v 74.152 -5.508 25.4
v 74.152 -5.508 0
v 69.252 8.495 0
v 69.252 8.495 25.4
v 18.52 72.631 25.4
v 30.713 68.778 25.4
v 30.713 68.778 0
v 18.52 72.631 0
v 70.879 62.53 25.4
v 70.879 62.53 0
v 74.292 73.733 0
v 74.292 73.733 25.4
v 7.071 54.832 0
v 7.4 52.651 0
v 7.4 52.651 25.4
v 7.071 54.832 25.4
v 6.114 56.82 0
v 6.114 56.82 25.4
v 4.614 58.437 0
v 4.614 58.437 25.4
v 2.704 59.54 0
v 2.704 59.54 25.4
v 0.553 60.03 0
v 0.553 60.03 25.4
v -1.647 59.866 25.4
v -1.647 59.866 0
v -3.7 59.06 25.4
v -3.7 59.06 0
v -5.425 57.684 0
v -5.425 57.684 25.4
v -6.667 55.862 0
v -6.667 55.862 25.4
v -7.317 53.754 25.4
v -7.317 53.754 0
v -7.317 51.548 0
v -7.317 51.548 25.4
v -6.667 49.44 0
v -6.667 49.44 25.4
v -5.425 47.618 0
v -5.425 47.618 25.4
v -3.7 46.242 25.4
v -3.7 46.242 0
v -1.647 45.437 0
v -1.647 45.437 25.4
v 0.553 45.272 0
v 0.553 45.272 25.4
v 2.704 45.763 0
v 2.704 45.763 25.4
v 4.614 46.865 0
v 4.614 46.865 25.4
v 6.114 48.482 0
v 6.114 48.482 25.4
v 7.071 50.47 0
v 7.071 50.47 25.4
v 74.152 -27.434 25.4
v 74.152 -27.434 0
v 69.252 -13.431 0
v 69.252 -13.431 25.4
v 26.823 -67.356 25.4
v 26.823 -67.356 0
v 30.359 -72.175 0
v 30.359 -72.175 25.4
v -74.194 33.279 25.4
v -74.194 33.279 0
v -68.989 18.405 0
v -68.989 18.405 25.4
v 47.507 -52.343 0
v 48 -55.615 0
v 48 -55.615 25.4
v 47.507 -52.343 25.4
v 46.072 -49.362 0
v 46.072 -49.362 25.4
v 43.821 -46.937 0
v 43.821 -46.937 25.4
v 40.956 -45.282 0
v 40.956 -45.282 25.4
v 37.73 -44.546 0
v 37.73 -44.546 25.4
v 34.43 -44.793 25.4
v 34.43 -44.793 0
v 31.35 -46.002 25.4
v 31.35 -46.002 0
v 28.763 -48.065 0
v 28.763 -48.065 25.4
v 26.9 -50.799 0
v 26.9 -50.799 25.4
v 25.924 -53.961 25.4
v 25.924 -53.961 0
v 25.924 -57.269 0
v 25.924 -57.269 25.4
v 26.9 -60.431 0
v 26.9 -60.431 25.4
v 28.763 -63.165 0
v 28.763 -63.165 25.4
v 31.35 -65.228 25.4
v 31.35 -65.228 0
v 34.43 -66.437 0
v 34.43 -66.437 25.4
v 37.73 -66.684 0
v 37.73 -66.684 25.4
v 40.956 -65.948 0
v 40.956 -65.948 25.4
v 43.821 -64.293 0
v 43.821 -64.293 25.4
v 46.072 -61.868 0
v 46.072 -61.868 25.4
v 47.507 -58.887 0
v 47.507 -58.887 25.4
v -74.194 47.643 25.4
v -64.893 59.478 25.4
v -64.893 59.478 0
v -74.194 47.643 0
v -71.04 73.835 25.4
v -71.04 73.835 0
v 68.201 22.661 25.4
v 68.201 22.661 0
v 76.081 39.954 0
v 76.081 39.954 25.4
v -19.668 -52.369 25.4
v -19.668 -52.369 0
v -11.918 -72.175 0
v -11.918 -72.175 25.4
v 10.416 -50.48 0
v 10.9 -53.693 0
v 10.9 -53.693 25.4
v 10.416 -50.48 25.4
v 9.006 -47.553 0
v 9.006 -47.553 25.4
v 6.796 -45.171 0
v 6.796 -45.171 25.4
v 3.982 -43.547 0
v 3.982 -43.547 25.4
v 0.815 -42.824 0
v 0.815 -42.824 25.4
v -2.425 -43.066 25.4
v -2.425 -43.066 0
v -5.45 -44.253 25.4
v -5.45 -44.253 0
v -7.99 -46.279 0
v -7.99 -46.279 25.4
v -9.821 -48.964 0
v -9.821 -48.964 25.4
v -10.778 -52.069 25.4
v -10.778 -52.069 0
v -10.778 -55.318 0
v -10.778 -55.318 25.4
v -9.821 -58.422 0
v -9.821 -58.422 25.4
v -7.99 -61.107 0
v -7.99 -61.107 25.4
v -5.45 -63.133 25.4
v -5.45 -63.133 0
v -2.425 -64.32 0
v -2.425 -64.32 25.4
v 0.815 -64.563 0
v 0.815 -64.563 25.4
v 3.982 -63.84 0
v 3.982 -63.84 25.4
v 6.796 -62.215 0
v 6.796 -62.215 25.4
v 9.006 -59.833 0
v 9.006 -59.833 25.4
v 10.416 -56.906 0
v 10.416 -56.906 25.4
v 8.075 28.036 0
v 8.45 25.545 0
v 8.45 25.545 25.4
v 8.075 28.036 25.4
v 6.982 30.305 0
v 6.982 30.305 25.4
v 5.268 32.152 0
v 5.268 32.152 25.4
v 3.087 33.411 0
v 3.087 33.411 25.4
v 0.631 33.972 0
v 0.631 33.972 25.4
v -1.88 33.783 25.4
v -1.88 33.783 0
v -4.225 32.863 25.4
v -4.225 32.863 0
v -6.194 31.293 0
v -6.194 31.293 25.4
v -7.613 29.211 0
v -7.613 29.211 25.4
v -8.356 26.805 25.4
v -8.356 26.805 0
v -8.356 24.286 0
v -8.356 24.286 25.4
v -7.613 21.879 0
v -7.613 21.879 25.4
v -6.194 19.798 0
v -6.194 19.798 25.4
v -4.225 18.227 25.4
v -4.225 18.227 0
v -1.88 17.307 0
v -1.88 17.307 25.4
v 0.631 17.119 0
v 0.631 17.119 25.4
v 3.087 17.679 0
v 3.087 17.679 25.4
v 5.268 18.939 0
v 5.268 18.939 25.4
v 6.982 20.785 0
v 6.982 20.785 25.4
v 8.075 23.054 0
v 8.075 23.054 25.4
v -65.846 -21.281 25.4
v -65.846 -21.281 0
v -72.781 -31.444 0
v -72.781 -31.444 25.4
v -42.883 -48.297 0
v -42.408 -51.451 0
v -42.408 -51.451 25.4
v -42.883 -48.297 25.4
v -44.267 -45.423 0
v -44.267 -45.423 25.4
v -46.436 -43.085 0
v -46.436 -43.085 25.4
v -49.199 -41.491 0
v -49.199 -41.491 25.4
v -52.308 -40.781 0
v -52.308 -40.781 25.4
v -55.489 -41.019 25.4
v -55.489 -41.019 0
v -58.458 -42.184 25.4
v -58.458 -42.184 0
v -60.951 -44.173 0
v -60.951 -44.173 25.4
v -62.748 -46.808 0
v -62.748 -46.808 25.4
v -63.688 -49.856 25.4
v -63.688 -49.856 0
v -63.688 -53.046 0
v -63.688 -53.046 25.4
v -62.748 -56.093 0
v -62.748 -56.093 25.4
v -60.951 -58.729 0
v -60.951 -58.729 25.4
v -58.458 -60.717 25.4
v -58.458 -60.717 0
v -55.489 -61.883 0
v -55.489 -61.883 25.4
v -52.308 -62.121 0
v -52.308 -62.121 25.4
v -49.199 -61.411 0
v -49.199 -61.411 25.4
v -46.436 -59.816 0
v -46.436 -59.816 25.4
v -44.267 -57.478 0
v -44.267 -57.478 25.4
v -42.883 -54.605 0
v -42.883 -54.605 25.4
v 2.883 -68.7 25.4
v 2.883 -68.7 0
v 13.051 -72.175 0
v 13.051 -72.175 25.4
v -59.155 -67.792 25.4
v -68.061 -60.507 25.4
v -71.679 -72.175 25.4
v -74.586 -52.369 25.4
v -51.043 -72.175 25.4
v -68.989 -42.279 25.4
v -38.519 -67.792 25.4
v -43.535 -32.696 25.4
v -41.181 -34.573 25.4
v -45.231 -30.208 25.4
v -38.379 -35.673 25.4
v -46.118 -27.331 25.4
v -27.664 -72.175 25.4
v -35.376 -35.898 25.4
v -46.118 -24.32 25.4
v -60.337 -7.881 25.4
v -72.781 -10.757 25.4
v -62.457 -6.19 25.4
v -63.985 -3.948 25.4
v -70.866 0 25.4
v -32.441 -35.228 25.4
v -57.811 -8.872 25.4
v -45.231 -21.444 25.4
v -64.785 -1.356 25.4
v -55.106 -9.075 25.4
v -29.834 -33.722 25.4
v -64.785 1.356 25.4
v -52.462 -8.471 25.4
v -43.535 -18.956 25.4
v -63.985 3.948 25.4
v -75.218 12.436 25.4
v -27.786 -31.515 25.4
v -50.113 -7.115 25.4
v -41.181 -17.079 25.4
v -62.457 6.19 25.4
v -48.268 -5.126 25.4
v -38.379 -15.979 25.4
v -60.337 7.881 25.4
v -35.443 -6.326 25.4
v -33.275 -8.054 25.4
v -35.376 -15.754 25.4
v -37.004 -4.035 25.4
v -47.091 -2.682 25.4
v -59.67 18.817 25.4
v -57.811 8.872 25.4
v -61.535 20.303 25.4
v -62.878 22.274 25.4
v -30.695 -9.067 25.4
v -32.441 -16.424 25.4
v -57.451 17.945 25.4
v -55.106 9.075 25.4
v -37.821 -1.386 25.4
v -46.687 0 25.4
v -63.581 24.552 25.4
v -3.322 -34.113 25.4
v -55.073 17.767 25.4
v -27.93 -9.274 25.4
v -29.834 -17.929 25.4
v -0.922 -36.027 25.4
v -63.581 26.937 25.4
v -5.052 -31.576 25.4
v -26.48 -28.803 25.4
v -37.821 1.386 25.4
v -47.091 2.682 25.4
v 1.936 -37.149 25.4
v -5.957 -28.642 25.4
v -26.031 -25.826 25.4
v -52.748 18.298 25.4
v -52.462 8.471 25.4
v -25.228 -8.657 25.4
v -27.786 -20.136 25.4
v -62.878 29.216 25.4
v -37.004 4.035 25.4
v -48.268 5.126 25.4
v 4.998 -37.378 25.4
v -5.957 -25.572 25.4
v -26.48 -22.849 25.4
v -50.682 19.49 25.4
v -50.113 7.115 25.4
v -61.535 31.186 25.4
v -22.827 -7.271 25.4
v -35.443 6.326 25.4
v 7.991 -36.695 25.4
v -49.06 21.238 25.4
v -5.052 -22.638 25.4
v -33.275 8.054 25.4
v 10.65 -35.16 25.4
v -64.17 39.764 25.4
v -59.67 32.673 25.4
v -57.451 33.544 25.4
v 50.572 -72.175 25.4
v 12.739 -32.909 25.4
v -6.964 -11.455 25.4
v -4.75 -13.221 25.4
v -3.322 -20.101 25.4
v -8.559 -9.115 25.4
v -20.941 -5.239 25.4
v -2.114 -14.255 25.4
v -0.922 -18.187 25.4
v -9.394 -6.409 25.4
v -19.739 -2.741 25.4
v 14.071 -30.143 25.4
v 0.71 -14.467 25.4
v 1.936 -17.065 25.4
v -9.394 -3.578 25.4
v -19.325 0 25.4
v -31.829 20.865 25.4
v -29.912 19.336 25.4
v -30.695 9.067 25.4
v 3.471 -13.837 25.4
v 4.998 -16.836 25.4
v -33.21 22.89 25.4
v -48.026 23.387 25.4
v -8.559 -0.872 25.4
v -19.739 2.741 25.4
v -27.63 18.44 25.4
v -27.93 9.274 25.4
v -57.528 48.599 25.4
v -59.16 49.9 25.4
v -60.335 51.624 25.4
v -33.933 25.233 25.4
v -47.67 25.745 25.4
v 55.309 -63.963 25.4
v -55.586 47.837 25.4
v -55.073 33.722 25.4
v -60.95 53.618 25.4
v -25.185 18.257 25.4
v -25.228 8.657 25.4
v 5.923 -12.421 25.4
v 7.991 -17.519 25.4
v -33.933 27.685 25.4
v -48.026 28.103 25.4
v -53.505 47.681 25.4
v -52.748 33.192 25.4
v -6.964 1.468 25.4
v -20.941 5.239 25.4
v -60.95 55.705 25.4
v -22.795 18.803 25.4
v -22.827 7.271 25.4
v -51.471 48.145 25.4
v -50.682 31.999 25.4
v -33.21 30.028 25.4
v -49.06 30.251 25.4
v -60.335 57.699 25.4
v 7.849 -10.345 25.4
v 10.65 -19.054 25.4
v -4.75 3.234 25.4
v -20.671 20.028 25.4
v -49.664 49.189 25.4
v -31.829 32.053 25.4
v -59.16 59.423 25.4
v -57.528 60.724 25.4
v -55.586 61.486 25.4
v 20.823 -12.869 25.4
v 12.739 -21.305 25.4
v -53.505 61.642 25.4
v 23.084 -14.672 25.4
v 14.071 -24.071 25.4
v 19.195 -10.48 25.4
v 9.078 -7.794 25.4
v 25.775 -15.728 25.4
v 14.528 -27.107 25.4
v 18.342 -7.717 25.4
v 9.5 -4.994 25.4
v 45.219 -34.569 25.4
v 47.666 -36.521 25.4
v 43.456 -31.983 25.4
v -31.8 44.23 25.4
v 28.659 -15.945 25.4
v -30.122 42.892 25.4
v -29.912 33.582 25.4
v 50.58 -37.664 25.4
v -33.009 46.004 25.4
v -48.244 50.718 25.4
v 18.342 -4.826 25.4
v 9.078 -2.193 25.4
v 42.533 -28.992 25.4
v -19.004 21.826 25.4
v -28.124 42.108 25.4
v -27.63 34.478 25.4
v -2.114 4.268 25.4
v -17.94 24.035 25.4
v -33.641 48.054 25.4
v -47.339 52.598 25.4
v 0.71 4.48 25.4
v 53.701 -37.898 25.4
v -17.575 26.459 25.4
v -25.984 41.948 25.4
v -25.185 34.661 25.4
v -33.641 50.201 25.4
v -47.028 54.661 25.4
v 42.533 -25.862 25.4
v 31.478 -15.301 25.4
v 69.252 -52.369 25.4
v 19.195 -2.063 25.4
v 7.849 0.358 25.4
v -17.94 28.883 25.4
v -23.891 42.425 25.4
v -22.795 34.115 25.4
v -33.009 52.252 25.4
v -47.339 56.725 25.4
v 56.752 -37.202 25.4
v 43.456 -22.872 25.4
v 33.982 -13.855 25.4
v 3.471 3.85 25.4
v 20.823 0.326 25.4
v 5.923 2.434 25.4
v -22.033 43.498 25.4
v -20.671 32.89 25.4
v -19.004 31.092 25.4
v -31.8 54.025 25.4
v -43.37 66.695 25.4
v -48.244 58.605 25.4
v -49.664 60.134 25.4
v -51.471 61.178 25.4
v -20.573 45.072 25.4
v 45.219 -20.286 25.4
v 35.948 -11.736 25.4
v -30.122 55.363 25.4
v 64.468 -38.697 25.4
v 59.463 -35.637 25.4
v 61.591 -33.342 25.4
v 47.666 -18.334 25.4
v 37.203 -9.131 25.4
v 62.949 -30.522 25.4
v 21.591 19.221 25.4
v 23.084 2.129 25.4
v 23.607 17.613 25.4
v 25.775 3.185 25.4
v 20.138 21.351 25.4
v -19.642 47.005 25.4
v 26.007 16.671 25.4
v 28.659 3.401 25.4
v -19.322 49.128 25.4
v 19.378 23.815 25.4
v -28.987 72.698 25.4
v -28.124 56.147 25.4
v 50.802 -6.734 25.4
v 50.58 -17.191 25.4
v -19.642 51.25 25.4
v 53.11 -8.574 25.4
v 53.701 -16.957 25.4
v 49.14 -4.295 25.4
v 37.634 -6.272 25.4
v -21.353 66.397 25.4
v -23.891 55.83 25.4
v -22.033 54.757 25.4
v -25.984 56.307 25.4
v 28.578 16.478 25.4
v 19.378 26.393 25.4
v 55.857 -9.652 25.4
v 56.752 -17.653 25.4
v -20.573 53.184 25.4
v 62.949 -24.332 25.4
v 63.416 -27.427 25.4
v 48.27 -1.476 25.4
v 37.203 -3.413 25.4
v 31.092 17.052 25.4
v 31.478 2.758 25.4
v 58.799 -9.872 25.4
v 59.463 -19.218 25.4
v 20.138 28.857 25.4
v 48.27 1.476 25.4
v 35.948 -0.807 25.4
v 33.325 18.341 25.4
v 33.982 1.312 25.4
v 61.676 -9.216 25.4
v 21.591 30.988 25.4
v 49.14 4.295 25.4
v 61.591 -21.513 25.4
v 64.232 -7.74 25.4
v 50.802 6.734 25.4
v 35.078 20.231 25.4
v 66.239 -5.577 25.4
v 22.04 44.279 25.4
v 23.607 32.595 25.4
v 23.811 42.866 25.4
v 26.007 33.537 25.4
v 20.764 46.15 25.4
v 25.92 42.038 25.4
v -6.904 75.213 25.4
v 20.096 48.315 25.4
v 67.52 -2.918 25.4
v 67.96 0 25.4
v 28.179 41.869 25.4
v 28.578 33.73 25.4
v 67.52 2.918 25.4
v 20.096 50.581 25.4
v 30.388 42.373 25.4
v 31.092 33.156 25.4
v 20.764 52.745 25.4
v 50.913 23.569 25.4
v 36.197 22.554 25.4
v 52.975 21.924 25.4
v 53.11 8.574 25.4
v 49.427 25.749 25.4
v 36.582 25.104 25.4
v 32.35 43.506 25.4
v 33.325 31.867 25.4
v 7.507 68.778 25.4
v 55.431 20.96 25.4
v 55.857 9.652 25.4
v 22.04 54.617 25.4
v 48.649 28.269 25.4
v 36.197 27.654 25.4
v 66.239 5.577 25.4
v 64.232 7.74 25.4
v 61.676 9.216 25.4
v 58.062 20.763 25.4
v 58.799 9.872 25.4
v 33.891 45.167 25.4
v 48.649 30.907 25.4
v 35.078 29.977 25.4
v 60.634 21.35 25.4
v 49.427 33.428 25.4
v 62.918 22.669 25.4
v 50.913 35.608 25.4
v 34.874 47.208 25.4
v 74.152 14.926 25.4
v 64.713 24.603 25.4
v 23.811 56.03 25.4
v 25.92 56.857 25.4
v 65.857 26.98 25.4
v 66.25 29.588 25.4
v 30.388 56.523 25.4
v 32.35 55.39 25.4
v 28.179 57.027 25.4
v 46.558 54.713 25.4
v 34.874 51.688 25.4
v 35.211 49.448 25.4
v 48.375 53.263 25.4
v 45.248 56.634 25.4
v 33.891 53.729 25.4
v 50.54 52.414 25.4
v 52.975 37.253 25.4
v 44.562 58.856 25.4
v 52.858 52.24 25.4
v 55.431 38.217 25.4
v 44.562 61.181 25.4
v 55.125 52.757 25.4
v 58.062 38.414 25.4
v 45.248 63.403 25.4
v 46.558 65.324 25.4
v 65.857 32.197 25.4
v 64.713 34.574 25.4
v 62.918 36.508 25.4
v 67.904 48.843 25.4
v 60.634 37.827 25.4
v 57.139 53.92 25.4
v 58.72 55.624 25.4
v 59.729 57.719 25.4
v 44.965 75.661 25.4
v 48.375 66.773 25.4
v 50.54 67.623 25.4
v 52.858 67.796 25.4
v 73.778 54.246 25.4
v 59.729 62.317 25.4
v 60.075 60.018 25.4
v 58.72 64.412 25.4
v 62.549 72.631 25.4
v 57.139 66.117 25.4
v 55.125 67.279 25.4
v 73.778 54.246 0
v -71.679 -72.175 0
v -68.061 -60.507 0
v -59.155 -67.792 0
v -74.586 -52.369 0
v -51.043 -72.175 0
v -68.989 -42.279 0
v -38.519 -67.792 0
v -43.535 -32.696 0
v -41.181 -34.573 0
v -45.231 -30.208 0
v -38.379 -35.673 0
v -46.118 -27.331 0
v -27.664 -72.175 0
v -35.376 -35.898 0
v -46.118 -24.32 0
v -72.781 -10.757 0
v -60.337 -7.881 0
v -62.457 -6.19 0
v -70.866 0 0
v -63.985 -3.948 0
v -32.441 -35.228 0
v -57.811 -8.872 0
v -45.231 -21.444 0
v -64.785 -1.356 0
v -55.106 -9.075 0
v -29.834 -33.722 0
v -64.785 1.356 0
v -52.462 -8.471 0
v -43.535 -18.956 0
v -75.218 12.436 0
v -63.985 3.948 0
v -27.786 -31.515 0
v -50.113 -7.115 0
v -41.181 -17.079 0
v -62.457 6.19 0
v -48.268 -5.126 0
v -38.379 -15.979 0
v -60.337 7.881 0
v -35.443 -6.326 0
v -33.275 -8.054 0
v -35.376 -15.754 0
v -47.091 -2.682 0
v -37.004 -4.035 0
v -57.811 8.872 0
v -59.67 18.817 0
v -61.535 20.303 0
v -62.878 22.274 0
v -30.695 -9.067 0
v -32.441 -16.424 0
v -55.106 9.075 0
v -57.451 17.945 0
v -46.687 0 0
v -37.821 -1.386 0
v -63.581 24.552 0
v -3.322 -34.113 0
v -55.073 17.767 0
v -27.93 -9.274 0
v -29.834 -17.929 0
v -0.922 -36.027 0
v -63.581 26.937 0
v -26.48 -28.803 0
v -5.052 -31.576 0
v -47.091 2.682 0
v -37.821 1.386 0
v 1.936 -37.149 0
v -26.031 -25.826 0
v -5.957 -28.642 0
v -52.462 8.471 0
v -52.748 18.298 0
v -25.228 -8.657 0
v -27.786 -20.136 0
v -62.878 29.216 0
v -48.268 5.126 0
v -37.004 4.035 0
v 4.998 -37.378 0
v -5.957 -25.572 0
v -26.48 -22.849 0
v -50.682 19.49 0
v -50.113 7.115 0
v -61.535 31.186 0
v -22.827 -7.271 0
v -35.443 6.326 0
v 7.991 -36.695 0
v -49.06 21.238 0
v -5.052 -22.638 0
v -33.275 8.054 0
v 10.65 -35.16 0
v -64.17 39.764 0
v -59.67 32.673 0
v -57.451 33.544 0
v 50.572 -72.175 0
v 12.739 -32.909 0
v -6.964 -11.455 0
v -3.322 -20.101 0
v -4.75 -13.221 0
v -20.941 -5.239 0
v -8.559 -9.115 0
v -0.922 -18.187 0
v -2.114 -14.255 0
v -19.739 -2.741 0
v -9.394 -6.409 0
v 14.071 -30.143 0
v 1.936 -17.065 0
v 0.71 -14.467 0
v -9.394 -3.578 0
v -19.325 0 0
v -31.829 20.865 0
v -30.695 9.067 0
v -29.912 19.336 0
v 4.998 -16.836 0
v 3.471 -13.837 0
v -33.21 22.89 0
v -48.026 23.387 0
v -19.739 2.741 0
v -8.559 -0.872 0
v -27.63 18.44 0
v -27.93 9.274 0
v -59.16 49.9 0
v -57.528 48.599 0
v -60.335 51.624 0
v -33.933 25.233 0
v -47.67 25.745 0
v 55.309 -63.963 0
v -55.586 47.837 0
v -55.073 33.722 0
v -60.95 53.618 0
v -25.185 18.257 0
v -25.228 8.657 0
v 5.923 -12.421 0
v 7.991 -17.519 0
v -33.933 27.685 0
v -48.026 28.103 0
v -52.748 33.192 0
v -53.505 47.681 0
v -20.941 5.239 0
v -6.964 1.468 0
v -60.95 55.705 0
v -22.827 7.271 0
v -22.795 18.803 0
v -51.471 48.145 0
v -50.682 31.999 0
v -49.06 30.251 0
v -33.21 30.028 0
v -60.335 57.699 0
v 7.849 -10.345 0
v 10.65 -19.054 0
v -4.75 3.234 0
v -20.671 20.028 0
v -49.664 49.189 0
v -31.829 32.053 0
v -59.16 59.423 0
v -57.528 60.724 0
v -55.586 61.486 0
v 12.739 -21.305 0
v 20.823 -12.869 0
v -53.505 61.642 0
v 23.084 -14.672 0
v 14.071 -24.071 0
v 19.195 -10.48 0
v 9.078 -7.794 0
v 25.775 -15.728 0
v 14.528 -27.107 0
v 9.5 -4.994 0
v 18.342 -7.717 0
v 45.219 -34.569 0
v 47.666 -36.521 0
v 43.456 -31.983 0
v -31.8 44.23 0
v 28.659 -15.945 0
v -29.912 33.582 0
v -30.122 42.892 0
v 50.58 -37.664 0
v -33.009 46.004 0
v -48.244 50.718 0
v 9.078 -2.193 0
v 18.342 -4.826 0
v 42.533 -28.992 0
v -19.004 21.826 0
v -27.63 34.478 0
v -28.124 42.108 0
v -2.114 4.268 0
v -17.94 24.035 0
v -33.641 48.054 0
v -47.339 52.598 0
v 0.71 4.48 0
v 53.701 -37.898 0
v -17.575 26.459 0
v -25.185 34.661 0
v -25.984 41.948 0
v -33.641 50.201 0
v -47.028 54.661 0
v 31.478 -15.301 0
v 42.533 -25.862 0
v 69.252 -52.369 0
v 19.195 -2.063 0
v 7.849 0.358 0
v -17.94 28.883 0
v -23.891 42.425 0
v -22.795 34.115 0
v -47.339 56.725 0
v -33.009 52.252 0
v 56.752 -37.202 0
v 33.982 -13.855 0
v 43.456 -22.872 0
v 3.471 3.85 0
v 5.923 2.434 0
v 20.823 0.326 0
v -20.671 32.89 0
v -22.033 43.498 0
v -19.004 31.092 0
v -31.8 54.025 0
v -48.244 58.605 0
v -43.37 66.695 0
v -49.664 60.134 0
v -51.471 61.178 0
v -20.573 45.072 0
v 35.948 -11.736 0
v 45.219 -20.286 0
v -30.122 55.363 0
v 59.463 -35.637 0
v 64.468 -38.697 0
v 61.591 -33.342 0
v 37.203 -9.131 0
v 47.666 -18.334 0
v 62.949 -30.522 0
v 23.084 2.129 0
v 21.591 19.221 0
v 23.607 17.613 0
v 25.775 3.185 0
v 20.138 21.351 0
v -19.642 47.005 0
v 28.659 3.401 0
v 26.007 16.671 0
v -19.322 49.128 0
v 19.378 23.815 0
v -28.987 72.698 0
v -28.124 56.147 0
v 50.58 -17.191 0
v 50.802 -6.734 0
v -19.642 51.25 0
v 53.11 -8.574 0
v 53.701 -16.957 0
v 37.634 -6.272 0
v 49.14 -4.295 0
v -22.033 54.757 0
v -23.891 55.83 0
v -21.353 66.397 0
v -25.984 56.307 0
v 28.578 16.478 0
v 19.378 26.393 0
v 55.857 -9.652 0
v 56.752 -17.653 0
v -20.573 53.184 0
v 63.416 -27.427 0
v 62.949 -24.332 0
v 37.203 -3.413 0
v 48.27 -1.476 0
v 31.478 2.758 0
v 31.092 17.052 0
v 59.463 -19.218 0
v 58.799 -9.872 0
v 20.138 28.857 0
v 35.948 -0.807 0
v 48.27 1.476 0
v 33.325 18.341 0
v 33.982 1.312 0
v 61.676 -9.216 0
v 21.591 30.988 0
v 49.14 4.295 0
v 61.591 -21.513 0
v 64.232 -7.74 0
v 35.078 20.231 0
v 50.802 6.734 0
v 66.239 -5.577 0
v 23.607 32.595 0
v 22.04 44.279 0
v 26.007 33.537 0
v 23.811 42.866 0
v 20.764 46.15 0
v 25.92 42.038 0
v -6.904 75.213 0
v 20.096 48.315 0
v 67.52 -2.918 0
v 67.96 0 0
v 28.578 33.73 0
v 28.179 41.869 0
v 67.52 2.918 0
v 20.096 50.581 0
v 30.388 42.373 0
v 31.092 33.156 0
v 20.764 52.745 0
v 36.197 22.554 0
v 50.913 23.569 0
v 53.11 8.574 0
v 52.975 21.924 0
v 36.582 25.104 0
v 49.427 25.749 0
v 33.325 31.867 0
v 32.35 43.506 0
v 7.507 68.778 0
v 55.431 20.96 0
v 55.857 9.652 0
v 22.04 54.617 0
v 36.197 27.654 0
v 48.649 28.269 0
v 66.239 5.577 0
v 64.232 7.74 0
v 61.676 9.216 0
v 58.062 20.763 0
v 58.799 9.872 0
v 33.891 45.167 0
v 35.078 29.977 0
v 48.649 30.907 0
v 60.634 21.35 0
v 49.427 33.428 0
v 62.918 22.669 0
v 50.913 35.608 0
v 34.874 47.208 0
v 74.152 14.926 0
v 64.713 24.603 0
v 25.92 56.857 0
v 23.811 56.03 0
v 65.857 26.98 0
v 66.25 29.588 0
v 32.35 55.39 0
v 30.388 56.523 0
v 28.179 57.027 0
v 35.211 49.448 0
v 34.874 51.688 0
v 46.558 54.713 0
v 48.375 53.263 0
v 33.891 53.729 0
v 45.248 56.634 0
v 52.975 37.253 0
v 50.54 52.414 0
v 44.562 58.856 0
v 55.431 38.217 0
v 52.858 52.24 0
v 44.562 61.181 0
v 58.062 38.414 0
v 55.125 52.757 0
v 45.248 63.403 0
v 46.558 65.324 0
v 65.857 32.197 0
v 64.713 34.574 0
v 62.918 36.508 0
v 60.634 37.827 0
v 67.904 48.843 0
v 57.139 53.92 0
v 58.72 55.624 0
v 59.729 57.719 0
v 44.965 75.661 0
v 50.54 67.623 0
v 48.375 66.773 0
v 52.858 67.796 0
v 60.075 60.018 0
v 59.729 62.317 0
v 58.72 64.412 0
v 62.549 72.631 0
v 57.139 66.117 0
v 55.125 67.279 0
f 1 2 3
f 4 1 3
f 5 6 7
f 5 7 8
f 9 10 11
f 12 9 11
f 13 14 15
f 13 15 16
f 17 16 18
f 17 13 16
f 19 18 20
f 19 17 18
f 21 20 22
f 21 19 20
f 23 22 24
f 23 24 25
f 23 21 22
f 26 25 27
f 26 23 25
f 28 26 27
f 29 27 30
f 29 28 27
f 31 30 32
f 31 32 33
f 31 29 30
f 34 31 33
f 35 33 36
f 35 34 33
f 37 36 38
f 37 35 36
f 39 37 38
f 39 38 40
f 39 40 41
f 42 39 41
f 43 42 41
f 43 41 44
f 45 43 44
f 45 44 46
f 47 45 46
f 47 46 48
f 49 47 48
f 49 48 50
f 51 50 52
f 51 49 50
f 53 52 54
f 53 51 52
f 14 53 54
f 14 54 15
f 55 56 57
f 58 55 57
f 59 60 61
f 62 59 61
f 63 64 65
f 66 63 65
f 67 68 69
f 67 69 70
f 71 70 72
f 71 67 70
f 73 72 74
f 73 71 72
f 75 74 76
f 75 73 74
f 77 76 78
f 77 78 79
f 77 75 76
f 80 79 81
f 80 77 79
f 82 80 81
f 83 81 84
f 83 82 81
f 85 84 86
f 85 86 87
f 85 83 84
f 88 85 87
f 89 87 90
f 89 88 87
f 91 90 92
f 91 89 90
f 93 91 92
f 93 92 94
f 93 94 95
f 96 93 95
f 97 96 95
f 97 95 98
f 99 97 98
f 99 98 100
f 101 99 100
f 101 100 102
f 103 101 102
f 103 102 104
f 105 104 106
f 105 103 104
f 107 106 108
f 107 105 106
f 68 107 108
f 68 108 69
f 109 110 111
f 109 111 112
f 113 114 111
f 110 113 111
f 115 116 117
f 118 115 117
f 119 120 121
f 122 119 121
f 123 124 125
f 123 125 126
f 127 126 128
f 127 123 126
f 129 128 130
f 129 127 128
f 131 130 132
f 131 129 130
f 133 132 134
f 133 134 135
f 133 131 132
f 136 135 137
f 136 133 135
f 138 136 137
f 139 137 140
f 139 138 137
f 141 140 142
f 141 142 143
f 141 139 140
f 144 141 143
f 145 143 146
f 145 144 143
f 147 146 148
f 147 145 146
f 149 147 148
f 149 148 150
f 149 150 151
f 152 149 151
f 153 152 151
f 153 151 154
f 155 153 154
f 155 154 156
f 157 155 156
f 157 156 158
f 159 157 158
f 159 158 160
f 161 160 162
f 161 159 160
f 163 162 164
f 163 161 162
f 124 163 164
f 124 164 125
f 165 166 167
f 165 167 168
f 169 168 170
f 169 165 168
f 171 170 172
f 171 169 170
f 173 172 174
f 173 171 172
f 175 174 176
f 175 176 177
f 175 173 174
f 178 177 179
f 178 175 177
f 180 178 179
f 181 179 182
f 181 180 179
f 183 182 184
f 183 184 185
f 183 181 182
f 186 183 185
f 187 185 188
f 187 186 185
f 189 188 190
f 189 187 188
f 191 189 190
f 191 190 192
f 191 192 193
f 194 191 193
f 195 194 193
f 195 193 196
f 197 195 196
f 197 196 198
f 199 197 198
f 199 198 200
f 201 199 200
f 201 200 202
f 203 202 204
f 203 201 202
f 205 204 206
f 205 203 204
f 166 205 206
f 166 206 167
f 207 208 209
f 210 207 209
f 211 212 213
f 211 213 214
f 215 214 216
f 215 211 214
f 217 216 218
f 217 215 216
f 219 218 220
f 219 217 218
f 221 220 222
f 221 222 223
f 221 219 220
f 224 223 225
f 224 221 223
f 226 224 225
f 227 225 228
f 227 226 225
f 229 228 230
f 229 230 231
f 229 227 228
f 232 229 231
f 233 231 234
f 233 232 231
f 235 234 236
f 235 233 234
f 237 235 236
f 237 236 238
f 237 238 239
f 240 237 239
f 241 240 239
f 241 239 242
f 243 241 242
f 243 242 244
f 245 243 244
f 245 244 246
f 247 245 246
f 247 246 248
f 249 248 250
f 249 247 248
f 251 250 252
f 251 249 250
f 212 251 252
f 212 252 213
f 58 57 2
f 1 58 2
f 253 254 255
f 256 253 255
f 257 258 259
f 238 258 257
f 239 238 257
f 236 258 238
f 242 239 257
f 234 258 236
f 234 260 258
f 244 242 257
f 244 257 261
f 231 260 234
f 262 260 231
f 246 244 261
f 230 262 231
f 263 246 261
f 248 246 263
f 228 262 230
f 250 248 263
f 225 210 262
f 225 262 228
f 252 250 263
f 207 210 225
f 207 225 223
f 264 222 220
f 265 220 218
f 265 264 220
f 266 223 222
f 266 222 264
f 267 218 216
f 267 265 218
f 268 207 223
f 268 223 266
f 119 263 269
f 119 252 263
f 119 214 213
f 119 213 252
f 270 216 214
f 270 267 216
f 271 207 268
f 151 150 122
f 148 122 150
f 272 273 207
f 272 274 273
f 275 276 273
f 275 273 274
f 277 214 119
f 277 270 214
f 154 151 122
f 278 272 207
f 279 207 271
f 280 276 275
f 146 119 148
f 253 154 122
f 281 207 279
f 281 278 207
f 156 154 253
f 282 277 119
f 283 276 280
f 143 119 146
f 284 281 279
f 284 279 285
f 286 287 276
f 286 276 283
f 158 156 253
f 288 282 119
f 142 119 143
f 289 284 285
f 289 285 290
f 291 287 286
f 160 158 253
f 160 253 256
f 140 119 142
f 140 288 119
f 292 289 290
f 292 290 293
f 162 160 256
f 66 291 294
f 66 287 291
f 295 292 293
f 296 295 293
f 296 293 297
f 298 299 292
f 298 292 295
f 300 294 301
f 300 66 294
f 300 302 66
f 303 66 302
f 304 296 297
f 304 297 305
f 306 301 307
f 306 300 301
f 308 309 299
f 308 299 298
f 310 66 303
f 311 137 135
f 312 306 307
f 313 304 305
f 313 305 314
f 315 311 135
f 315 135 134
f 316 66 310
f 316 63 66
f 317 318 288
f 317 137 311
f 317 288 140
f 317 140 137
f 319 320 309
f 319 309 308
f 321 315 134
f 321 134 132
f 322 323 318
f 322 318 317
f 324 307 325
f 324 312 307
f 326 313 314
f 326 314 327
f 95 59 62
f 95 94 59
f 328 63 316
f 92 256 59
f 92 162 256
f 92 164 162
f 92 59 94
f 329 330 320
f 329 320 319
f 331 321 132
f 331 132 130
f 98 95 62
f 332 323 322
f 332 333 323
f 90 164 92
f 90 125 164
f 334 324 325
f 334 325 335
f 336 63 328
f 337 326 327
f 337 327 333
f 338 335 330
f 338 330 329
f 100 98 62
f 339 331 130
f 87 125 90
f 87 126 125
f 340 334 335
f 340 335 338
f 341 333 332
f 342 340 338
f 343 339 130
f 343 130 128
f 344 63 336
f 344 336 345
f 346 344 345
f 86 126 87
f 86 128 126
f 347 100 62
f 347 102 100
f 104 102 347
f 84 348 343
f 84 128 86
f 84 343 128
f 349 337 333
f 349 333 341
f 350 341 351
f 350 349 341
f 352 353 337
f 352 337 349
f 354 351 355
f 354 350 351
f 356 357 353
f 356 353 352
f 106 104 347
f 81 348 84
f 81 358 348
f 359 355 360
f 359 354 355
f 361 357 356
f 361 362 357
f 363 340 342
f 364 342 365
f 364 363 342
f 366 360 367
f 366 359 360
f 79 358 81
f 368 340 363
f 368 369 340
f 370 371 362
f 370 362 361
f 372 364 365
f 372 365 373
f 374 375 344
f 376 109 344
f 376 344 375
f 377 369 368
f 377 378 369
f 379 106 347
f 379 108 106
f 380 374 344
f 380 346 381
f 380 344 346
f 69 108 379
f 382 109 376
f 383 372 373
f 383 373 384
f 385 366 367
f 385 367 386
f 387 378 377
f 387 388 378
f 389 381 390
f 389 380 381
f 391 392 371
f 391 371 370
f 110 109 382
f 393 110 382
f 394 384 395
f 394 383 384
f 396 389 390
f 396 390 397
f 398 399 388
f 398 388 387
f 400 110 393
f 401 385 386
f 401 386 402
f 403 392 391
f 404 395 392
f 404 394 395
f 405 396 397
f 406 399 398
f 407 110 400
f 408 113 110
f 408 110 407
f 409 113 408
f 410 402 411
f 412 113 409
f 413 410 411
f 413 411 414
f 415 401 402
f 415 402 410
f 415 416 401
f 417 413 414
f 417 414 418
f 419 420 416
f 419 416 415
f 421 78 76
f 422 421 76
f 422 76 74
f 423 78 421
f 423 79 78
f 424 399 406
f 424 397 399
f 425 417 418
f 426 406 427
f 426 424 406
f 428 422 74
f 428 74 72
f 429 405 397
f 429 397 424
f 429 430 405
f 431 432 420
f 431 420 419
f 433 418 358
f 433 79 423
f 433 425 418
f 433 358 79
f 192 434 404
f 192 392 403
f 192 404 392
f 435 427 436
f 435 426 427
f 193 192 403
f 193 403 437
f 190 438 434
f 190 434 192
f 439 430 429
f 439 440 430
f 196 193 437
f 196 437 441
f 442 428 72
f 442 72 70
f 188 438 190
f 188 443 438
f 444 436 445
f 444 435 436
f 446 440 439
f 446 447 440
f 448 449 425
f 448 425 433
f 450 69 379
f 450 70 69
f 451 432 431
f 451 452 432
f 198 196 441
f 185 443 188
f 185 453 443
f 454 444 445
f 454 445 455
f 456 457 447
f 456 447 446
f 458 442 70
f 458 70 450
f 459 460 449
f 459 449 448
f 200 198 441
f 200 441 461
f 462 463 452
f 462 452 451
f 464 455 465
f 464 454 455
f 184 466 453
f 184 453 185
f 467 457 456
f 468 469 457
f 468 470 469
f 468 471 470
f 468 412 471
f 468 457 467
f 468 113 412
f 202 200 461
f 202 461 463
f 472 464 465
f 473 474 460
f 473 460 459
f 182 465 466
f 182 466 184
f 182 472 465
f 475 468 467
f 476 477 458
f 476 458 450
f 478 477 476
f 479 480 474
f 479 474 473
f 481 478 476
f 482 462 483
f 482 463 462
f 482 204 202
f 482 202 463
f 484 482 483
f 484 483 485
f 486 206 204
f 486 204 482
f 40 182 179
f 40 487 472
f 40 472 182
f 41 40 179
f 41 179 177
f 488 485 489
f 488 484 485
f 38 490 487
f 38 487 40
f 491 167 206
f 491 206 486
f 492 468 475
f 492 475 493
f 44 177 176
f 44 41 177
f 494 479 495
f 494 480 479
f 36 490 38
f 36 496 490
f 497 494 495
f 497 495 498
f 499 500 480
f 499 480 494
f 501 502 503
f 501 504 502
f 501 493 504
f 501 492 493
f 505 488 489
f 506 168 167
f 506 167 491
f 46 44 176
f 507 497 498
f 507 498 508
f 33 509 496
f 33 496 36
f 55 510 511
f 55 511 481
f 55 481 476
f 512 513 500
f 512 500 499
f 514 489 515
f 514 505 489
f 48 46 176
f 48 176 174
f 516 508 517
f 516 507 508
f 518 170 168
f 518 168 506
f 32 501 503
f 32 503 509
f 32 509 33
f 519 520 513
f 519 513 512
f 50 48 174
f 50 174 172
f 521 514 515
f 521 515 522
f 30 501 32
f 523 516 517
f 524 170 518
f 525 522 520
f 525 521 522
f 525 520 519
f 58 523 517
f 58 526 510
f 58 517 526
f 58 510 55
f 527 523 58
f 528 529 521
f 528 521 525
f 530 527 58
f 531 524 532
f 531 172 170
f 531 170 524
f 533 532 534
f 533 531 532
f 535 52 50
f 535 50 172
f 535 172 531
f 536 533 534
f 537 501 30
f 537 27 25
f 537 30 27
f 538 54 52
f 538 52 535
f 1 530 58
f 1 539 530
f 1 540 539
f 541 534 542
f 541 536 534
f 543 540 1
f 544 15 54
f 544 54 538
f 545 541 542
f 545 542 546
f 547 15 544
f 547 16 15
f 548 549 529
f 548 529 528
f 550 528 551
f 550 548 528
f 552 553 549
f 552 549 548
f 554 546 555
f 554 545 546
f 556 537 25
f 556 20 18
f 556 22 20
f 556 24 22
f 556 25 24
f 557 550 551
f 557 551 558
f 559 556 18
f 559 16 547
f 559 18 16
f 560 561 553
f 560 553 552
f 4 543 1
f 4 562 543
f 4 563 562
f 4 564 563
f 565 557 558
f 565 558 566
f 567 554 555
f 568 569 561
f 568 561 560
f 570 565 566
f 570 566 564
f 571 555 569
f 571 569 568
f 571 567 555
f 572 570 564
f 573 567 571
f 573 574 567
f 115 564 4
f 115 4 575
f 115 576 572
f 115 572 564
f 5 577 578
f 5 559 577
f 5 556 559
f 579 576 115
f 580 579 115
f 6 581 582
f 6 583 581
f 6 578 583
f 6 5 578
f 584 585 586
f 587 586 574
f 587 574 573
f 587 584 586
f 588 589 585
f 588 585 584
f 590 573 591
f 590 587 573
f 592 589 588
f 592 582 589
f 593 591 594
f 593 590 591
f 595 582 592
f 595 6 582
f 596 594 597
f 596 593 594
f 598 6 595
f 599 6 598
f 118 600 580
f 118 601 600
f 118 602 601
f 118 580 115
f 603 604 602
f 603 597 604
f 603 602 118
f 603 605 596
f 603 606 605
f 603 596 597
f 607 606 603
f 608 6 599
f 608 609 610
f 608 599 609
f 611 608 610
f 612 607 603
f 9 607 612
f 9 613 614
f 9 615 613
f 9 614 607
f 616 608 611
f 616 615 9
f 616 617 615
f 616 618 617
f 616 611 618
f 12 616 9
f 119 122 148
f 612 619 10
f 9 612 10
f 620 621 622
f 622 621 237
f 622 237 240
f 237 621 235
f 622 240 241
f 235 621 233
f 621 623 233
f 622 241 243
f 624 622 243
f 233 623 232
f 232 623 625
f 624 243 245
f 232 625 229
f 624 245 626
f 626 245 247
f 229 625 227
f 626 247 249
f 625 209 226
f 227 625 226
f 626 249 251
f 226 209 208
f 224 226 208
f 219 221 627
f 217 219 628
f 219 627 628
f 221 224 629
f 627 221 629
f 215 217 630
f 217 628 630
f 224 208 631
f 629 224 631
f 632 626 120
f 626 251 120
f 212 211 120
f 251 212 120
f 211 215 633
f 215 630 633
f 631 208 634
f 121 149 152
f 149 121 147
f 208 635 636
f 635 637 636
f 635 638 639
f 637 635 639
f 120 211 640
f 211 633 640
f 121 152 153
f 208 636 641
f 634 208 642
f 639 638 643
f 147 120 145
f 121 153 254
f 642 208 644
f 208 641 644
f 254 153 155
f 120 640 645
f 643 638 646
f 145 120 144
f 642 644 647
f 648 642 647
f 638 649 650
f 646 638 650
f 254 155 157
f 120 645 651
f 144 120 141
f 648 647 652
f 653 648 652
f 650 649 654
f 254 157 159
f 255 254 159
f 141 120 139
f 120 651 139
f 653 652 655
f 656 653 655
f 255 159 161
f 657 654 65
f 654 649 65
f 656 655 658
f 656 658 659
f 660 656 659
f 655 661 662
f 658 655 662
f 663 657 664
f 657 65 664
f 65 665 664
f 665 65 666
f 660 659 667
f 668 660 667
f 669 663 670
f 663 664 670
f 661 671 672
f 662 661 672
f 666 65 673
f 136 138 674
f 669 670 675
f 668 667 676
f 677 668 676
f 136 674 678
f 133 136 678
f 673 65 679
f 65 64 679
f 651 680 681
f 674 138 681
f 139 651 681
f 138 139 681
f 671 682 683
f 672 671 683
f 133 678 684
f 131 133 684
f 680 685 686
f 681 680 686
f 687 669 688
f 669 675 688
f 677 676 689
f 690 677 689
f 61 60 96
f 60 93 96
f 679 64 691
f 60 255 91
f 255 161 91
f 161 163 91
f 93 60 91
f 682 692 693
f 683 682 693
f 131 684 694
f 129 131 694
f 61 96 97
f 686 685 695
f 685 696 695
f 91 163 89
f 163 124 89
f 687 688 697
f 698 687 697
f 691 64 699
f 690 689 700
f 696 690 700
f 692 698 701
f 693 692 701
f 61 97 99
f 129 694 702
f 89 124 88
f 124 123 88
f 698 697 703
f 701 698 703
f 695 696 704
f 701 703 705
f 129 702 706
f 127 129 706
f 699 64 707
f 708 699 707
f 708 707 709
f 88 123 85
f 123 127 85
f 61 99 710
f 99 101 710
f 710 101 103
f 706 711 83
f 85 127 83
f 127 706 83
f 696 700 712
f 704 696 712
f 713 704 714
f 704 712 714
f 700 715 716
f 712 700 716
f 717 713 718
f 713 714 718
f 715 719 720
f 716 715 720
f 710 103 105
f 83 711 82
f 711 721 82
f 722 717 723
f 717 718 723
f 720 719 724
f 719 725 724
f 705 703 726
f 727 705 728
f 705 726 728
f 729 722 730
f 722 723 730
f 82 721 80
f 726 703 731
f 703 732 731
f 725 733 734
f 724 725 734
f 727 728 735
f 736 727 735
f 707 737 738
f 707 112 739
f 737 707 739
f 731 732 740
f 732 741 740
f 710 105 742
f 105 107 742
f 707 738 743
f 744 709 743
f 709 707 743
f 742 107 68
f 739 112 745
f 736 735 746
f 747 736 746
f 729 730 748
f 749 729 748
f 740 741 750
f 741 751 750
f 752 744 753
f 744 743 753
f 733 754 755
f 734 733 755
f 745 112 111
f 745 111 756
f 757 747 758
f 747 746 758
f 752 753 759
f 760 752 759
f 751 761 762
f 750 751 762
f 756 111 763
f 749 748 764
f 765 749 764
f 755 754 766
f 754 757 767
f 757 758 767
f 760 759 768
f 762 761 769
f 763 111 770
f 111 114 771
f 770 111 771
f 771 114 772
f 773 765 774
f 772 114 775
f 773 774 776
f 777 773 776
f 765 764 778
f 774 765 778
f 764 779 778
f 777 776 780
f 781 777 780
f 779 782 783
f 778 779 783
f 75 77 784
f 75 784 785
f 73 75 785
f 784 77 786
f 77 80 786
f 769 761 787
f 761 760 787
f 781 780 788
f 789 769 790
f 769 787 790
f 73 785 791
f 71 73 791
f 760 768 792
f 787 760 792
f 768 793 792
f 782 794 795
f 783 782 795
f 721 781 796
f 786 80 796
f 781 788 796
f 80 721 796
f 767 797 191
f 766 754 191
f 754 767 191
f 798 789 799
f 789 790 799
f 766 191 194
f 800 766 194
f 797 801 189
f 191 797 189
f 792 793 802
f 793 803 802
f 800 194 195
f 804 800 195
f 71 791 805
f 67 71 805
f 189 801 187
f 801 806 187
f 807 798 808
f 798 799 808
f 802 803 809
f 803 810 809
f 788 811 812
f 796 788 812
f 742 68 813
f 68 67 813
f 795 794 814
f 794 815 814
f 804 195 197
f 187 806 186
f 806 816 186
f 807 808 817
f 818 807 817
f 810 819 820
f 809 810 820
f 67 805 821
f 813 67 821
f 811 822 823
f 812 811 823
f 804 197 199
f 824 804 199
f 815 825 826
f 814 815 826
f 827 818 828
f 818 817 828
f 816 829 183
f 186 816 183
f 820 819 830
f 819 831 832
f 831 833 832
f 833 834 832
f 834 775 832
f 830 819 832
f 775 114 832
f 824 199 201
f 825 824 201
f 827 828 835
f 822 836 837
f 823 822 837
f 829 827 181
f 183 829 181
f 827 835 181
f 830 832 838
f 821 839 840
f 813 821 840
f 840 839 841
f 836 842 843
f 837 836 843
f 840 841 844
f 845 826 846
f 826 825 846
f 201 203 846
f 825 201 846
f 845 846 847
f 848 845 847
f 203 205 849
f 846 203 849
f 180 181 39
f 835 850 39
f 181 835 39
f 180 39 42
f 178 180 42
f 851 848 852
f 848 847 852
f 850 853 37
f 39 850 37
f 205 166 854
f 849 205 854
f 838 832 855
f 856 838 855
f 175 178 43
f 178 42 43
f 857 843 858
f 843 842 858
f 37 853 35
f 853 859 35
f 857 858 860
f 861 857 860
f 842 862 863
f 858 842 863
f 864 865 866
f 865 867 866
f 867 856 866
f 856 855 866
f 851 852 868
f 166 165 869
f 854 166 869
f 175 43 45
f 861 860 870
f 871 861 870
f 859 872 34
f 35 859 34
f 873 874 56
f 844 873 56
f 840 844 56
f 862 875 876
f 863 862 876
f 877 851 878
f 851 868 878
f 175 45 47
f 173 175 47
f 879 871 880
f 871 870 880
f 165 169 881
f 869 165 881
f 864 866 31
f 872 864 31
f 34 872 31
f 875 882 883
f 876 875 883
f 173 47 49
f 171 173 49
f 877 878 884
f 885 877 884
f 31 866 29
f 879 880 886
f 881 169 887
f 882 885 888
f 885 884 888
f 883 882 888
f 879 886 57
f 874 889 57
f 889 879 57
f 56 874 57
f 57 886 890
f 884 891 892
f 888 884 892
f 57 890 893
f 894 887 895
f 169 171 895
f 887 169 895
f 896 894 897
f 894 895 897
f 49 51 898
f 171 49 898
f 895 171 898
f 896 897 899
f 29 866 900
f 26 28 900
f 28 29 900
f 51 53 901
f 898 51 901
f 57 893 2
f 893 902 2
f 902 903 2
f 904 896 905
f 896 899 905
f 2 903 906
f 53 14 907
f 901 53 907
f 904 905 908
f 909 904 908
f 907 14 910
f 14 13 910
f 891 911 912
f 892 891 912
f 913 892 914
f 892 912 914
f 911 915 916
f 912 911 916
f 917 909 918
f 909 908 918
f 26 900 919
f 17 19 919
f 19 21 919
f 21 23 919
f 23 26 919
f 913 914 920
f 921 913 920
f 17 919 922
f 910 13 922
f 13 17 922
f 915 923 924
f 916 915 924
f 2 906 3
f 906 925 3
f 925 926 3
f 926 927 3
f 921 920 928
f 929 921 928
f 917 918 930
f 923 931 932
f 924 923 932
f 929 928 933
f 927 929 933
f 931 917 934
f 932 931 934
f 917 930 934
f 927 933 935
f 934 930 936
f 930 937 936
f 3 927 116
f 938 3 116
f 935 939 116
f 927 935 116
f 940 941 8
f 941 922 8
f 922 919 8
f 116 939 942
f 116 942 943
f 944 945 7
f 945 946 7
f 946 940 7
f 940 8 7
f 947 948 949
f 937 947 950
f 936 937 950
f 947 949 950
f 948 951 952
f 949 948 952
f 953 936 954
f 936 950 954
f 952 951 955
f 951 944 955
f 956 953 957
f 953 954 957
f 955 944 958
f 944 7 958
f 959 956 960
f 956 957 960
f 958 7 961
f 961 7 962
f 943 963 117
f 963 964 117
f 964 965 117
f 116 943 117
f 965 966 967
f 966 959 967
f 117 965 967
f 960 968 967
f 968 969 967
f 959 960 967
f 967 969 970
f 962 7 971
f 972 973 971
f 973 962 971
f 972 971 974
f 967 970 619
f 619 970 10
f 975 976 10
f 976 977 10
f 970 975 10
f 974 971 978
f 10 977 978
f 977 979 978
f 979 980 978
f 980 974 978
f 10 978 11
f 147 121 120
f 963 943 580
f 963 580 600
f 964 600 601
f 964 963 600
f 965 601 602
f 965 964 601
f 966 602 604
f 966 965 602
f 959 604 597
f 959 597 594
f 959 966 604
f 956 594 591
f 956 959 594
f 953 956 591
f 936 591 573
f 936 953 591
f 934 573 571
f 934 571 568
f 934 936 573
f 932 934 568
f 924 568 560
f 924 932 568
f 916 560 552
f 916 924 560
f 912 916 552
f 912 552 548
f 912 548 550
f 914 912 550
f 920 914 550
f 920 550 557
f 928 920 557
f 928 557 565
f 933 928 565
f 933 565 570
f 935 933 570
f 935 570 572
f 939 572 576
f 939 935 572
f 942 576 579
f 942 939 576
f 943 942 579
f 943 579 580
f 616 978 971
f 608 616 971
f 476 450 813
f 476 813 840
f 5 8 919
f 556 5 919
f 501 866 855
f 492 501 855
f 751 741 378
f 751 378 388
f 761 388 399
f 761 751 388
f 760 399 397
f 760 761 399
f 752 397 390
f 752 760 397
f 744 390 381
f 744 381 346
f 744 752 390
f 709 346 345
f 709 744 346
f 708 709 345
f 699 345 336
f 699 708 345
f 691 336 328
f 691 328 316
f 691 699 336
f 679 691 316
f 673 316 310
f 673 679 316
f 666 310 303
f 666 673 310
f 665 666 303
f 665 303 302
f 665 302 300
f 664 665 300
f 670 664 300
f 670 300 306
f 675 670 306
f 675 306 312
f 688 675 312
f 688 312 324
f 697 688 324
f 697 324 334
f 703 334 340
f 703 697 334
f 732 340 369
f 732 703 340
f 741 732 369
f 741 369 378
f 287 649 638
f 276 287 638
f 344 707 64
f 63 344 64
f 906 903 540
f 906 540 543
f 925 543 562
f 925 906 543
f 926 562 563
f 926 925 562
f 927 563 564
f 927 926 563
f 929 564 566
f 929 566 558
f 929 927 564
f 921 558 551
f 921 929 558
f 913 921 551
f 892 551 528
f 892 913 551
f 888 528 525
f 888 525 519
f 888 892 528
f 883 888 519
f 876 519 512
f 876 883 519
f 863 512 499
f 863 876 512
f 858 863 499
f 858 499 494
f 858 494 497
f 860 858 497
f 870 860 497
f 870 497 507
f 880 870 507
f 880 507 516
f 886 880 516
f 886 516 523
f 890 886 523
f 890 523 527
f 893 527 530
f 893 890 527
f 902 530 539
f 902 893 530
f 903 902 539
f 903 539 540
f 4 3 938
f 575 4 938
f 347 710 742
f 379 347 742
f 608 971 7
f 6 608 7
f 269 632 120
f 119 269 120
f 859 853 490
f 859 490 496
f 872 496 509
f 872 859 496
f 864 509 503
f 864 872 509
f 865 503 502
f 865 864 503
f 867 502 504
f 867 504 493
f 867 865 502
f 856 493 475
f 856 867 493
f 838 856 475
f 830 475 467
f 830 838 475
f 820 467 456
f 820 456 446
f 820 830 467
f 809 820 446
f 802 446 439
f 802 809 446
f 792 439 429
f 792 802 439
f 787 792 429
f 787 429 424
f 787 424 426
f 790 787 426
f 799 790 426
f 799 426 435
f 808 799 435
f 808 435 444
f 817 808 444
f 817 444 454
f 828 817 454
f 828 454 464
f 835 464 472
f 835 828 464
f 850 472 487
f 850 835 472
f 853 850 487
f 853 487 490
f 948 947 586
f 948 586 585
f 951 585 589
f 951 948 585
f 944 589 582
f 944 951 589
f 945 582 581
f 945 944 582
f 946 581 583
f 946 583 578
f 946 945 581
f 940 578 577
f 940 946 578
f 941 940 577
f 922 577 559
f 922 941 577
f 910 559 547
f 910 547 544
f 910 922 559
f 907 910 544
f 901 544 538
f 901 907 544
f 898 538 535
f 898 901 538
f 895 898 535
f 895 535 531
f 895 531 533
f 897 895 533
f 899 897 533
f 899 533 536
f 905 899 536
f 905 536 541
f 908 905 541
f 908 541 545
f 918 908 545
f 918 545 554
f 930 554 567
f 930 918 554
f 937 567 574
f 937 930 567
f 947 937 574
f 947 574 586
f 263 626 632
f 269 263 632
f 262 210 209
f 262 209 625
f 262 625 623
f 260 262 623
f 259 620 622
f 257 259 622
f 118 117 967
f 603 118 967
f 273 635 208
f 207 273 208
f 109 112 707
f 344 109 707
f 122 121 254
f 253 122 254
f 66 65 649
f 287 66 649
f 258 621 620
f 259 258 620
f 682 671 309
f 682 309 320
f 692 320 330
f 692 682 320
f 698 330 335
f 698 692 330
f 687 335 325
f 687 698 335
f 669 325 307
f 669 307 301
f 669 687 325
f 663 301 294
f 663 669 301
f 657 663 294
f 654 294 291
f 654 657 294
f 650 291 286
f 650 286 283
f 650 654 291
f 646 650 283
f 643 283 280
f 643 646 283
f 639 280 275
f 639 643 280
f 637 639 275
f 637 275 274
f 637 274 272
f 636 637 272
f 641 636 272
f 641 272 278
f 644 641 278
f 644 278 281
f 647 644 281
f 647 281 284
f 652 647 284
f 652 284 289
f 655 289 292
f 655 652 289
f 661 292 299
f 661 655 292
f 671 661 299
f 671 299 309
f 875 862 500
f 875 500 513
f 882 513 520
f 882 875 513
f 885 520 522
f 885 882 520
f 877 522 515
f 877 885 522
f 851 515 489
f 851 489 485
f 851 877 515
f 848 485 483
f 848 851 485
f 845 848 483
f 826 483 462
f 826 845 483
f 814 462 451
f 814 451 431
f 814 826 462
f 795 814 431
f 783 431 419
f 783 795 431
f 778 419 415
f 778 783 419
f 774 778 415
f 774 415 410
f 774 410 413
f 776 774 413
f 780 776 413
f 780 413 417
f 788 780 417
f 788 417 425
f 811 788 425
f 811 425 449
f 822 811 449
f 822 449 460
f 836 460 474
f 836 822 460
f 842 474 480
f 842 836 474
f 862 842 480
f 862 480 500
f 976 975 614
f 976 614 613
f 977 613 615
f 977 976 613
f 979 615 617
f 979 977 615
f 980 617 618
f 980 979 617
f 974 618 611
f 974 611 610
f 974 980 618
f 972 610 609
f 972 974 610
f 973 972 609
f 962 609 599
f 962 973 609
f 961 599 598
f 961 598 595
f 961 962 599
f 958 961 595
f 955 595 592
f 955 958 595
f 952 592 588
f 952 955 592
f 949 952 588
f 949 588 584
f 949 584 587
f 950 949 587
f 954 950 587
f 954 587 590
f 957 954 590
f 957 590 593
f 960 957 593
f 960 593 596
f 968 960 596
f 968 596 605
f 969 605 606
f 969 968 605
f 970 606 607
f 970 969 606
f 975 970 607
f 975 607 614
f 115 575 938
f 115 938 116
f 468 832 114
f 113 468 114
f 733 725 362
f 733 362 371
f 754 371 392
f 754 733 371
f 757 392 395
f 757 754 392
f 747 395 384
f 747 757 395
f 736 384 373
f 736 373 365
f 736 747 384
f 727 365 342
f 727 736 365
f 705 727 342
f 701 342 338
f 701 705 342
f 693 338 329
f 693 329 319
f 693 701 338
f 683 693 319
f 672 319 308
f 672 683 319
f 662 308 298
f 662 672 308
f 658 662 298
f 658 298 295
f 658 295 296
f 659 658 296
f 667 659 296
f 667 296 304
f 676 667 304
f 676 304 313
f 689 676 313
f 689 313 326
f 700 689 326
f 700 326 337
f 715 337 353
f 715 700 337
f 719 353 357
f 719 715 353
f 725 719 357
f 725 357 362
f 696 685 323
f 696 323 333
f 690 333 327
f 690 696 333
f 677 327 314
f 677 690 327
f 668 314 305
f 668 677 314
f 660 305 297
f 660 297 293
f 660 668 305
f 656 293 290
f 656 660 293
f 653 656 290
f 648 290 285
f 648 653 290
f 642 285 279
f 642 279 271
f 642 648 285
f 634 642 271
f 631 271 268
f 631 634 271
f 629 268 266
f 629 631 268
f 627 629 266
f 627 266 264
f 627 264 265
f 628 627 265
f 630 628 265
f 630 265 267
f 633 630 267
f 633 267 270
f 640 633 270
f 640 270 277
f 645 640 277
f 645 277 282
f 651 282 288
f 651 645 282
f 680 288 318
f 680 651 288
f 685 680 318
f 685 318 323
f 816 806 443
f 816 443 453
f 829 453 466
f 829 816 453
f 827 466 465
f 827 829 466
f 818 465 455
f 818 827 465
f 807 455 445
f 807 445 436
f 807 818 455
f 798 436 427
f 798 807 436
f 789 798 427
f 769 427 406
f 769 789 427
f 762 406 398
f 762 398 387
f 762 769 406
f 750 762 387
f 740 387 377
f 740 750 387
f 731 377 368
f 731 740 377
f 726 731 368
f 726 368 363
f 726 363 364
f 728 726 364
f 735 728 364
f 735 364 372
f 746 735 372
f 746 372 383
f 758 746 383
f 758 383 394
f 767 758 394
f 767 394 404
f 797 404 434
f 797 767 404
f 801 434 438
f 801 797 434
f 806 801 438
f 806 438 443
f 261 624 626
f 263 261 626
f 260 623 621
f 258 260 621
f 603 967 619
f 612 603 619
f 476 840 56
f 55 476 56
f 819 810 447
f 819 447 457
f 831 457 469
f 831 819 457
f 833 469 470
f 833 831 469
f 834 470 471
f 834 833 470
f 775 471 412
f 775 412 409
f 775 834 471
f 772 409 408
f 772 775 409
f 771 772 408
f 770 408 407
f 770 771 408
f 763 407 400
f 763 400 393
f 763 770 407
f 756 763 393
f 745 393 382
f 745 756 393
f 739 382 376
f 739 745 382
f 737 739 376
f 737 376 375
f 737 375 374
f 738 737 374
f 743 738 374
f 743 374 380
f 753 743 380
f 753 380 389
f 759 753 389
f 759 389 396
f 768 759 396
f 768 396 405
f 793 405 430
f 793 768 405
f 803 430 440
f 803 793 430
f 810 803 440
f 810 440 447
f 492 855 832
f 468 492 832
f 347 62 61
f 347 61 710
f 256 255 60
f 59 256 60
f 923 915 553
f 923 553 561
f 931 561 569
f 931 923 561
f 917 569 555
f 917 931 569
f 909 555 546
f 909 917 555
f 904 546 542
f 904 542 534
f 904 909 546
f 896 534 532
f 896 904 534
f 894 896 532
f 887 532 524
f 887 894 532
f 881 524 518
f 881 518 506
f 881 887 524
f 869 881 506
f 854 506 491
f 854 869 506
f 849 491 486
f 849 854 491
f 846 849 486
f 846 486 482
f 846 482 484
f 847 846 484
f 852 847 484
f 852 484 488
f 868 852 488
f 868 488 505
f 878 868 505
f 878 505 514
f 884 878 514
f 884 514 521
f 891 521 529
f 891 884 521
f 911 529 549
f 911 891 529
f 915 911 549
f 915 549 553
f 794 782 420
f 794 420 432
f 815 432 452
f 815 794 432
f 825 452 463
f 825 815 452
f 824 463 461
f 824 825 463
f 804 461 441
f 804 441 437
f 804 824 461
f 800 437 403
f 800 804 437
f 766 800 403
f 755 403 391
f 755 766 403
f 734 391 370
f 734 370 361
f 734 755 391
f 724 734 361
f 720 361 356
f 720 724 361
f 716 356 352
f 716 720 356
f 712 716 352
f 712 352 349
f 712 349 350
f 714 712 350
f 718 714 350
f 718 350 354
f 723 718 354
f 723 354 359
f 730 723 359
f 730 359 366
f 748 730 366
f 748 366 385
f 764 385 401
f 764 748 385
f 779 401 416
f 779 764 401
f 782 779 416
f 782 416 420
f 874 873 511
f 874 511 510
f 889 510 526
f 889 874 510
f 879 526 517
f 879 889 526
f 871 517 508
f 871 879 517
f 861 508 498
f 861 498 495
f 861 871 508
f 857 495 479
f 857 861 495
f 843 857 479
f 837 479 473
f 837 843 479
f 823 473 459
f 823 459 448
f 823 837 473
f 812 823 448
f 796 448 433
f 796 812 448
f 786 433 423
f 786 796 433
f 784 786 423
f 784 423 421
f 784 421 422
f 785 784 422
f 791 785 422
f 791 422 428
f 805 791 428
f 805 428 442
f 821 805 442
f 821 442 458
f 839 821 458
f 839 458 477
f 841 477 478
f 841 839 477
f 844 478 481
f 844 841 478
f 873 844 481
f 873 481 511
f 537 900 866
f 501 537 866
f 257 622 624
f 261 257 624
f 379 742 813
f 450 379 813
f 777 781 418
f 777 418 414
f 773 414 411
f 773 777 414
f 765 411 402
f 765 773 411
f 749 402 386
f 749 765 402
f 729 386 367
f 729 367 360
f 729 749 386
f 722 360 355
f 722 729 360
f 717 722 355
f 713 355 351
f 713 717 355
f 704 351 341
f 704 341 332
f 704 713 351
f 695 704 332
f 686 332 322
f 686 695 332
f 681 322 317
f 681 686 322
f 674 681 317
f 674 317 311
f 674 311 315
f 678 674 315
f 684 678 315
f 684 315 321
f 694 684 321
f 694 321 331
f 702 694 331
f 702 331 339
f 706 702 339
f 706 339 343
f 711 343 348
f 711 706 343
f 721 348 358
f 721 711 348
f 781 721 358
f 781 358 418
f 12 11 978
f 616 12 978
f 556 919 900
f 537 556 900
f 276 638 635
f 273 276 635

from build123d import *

# Parameters (mm, degrees)
F0_R     = 10.7
F0_R_2   = 10.9
F0_R_3   = 9.1
F0_R_4   = 10.1
F0_R_5   = 9.3
F0_R_6   = 9.5
F0_R_7   = 11.1
F0_R_8   = 10.3
F0_R_9   = 9.7
F0_R_10  = 10.5
F0_R_11  = 9.9
F0_R_12  = 8
F0_R_13  = 8.225
F0_R_14  = 8.45
F0_R_15  = 7
F0_R_16  = 7.2
F0_R_17  = 7.4
F0_R_18  = 8.65
F0_R_19  = 8.85
F0_R_20  = 7.6
F0_R_21  = 7.8
F1_DEPTH = 25.4


with BuildPart() as f1:
    # F0 (on Top) → F1 (new body)
    with BuildSketch(Plane.XY):
        Polygon((-43.370046, 66.694871), (-71.039788, 73.835447), (-64.892714, 59.478019), (-74.194374, 47.642876), (-64.169625, 39.764069), (-74.194374, 33.27913), (-68.989453, 18.404532), (-75.21798, 12.435964), (-70.866387, 0), (-72.780757, -10.756556), (-65.846058, -21.280914), (-72.780757, -31.444447), (-68.989453, -42.279216), (-74.58584, -52.368706), (-68.060883, -60.507296), (-71.679206, -72.174512), (-59.155129, -67.792086), (-51.042687, -72.174512), (-38.51861, -67.792086), (-27.663881, -72.174512), (-19.667598, -52.368706), (-11.918255, -72.174512), (2.882631, -68.700455), (13.051437, -72.174512), (26.823167, -67.355507), (30.359259, -72.174512), (41.413072, -72.174512), (50.571952, -72.174512), (55.309299, -63.963108), (69.252096, -52.368706), (64.468175, -38.697239), (74.15197, -27.434214), (69.252096, -13.431376), (74.15197, -5.508246), (69.252096, 8.494591), (74.15197, 14.925677), (68.20149, 22.661304), (76.080737, 39.954469), (67.903966, 48.843425), (73.777615, 54.246476), (70.879206, 62.529534), (74.291575, 73.733234), (62.548533, 72.631314), (44.964856, 75.661271), (30.713456, 68.777539), (18.519877, 72.631314), (7.506575, 68.777539), (-6.904133, 75.213181), (-21.353263, 66.397347), (-28.986626, 72.697847), align=None)
        with Locations((-53.107839, -51.450886)):
            Circle(F0_R, mode=Mode.SUBTRACT)
        with Locations((0, -53.693082)):
            Circle(F0_R_2, mode=Mode.SUBTRACT)
        with Locations((-55.786539, 0)):
            Circle(F0_R_3, mode=Mode.SUBTRACT)
        with Locations((-36.131218, -25.825793)):
            Circle(F0_R_4, mode=Mode.SUBTRACT)
        with Locations((-28.625328, 0)):
            Circle(F0_R_5, mode=Mode.SUBTRACT)
        with Locations((0, -4.993503)):
            Circle(F0_R_6, mode=Mode.SUBTRACT)
        with Locations((36.900301, -55.614963)):
            Circle(F0_R_7, mode=Mode.SUBTRACT)
        with Locations((4.228305, -27.107049)):
            Circle(F0_R_8, mode=Mode.SUBTRACT)
        with Locations((27.933899, -6.271678)):
            Circle(F0_R_9, mode=Mode.SUBTRACT)
        with Locations((52.915979, -27.427362)):
            Circle(F0_R_10, mode=Mode.SUBTRACT)
        with Locations((58.059551, 0)):
            Circle(F0_R_11, mode=Mode.SUBTRACT)
        with Locations((-55.670351, 25.744705)):
            Circle(F0_R_12, mode=Mode.SUBTRACT)
        with Locations((-25.799653, 26.459009)):
            Circle(F0_R_13, mode=Mode.SUBTRACT)
        with Locations((0, 25.545178)):
            Circle(F0_R_14, mode=Mode.SUBTRACT)
        with Locations((-54.028157, 54.661482)):
            Circle(F0_R_15, mode=Mode.SUBTRACT)
        with Locations((-26.521808, 49.127601)):
            Circle(F0_R_16, mode=Mode.SUBTRACT)
        with Locations((0, 52.651051)):
            Circle(F0_R_17, mode=Mode.SUBTRACT)
        with Locations((27.931513, 25.104078)):
            Circle(F0_R_18, mode=Mode.SUBTRACT)
        with Locations((57.400368, 29.588468)):
            Circle(F0_R_19, mode=Mode.SUBTRACT)
        with Locations((27.6112, 49.447916)):
            Circle(F0_R_20, mode=Mode.SUBTRACT)
        with Locations((52.275352, 60.018267)):
            Circle(F0_R_21, mode=Mode.SUBTRACT)
    extrude(amount=F1_DEPTH)


solid = f1.part
